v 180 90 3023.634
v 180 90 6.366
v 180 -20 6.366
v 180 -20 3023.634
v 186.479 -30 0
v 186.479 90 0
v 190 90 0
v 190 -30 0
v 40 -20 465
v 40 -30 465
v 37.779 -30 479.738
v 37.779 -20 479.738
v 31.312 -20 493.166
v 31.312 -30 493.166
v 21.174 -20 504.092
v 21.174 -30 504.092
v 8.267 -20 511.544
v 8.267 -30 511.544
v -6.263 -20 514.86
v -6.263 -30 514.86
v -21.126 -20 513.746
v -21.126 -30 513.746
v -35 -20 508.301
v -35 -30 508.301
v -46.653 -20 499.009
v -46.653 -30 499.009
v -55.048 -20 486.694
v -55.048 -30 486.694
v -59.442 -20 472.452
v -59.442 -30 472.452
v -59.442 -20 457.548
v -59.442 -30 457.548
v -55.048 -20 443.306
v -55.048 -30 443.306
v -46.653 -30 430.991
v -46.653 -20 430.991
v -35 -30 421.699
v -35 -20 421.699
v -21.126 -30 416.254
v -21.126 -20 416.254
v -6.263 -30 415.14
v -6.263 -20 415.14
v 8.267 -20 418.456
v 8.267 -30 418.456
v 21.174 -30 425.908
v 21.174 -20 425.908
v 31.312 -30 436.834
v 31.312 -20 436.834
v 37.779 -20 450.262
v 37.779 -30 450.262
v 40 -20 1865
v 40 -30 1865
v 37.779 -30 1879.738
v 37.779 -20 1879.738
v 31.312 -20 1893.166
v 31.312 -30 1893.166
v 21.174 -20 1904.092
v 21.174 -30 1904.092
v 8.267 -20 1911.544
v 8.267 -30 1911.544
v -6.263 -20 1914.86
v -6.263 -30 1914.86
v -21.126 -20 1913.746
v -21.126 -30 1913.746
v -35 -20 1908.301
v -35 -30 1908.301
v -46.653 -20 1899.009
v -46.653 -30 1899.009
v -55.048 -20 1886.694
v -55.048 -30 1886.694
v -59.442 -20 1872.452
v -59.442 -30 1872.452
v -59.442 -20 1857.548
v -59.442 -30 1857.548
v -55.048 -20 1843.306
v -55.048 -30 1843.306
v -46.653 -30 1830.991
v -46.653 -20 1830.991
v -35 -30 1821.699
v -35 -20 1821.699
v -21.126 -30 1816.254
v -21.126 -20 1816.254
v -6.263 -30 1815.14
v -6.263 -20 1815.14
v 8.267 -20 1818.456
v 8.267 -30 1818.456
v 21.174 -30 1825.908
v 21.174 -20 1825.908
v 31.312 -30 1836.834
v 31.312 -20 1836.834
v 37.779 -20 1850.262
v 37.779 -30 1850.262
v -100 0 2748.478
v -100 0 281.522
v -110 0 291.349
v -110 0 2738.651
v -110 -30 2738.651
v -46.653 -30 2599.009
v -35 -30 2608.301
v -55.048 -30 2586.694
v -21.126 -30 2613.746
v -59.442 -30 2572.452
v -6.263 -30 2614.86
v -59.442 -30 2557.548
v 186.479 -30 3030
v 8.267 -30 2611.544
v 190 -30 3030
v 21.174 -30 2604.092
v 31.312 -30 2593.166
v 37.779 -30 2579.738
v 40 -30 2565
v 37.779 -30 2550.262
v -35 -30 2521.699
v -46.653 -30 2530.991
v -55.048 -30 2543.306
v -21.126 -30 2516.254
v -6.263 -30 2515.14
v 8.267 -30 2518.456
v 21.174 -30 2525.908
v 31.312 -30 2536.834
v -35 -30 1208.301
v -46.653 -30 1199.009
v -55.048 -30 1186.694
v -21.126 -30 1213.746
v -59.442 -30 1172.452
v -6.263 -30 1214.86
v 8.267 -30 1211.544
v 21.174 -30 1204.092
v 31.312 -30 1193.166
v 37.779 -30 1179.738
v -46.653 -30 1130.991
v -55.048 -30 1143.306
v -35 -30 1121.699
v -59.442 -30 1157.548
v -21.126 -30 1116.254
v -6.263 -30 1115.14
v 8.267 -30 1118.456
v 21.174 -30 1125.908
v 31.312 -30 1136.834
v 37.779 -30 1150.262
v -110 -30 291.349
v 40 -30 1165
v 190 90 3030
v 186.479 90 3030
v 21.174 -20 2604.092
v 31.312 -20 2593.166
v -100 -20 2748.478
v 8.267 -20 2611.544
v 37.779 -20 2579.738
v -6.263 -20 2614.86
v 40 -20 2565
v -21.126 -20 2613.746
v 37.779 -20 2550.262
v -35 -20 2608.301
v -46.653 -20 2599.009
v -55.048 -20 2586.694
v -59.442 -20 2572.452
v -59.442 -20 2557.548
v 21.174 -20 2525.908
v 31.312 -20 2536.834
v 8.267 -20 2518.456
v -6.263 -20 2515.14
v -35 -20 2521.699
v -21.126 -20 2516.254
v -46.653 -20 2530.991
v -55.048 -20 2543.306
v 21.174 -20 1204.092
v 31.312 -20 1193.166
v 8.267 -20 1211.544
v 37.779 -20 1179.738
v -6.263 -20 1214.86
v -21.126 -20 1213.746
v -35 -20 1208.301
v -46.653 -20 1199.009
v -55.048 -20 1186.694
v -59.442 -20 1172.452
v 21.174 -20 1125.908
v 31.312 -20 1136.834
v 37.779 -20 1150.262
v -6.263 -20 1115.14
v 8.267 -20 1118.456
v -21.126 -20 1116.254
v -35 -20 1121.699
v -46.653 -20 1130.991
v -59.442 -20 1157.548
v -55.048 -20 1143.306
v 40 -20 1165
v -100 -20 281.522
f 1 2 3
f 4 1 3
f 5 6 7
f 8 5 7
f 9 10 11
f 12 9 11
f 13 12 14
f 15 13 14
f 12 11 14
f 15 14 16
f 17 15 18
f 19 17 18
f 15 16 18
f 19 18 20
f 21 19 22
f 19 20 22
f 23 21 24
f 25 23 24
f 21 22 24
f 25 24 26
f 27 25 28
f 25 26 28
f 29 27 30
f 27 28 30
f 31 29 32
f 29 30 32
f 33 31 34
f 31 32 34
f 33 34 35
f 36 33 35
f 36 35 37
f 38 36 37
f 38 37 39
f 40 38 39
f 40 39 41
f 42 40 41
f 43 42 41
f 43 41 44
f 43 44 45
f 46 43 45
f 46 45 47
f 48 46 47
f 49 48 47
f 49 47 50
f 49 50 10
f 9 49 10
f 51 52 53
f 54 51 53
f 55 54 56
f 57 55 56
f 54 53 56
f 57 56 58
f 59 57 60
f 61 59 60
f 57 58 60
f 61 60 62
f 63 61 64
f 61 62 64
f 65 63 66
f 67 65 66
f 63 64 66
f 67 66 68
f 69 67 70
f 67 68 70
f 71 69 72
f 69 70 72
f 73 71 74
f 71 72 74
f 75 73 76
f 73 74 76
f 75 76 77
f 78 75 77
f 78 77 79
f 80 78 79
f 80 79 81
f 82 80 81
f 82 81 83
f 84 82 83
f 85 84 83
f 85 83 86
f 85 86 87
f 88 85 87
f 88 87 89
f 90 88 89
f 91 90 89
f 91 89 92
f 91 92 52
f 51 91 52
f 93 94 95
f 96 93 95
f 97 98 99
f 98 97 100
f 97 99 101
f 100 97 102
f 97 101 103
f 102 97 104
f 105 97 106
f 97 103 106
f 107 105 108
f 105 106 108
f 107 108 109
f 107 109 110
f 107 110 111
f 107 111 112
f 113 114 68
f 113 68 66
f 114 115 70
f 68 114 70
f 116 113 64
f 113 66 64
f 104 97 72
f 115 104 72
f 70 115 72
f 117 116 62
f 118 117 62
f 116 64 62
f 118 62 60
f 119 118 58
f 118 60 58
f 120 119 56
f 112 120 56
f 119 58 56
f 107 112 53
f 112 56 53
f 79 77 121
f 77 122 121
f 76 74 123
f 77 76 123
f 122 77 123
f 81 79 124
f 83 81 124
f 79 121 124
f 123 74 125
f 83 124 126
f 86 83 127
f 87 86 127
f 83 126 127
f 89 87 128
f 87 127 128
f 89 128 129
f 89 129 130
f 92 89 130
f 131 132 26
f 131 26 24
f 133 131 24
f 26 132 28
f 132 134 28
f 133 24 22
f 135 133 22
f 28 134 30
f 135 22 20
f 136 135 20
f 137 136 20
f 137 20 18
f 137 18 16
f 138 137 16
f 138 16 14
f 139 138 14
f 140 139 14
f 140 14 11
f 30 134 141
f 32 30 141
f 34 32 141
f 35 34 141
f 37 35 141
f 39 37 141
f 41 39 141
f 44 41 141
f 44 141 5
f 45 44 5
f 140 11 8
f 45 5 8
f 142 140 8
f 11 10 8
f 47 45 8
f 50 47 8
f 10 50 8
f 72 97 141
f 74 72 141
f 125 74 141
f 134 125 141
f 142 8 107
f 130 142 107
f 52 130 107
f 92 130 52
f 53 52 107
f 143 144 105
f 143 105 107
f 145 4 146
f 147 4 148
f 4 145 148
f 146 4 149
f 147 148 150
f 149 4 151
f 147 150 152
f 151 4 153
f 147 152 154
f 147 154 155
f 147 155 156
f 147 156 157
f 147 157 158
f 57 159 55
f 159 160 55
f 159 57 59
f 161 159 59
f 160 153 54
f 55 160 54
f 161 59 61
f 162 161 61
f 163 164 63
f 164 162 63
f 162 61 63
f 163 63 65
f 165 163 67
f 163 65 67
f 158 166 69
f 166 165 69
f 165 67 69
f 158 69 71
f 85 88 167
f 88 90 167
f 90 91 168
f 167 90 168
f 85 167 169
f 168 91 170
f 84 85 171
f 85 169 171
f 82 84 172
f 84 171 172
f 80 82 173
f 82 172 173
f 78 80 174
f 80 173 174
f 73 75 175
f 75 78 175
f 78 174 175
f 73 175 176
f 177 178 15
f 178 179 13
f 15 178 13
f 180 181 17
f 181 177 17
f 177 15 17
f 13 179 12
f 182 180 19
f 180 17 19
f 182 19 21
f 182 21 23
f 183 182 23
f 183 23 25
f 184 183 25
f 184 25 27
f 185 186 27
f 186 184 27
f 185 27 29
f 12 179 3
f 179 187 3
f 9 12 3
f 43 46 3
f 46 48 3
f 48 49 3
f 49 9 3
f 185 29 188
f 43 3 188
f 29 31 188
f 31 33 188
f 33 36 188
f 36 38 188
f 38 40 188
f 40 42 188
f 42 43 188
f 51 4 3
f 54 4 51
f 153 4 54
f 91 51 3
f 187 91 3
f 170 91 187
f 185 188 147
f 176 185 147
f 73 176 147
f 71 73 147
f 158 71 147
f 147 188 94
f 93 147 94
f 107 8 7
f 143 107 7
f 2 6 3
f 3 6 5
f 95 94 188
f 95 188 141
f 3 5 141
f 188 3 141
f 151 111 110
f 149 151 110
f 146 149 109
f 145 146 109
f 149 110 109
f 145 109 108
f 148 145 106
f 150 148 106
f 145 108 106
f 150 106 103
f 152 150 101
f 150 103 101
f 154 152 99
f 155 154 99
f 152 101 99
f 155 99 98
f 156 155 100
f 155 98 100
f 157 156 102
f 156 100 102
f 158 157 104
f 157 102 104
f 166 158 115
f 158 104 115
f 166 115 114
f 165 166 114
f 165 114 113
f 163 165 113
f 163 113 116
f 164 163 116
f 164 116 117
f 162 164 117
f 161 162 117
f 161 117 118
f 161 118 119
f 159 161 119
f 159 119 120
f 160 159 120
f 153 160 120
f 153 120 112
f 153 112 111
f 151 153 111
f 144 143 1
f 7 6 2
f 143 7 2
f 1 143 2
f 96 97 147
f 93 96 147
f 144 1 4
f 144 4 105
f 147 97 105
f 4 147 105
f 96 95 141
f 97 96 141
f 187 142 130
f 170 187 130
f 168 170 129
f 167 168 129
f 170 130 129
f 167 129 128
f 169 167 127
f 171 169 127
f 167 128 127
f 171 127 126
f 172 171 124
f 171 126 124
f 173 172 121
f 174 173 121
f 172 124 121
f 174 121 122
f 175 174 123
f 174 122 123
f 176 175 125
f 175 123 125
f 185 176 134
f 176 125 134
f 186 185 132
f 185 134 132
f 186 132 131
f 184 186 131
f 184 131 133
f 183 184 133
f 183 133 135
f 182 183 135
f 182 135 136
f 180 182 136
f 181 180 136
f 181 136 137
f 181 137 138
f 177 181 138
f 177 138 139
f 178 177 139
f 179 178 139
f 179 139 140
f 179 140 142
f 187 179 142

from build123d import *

# Parameters (mm, degrees)
F1_DEPTH = 3030
F3_DEPTH = 200
F4_R     = 50
F5_DEPTH = 120.001


with BuildPart() as f1:
    # F0 (on Top) → F1 (new body)
    with BuildSketch(Plane.XY):
        Polygon((-100, 0), (-110, 0), (-110, -30), (190, -30), (190, 90), (180, 90), (180, -20), (-100, -20), align=None)
    extrude(amount=F1_DEPTH)

    # F2 (on face) → F3 (cut)
    with BuildSketch(Plane.XZ.offset(30)):
        Polygon((186.4785214056, 0), (-110, 291.3486315578), (-110, 0), align=None)
        Polygon((-110, 3030), (-110, 2738.6513684422), (186.4785214056, 3030), align=None)
    extrude(amount=-F3_DEPTH, mode=Mode.SUBTRACT)

    # F4 (on face) → F5 (cut, through all)
    with BuildSketch(Plane.XZ.offset(30)):
        with Locations((-10, 465)):
            Circle(F4_R)
        with Locations((-10, 1165)):
            Circle(F4_R)
        with Locations((-10, 1865)):
            Circle(F4_R)
        with Locations((-10, 2565)):
            Circle(F4_R)
    extrude(amount=-F5_DEPTH, mode=Mode.SUBTRACT)


solid = f1.part
